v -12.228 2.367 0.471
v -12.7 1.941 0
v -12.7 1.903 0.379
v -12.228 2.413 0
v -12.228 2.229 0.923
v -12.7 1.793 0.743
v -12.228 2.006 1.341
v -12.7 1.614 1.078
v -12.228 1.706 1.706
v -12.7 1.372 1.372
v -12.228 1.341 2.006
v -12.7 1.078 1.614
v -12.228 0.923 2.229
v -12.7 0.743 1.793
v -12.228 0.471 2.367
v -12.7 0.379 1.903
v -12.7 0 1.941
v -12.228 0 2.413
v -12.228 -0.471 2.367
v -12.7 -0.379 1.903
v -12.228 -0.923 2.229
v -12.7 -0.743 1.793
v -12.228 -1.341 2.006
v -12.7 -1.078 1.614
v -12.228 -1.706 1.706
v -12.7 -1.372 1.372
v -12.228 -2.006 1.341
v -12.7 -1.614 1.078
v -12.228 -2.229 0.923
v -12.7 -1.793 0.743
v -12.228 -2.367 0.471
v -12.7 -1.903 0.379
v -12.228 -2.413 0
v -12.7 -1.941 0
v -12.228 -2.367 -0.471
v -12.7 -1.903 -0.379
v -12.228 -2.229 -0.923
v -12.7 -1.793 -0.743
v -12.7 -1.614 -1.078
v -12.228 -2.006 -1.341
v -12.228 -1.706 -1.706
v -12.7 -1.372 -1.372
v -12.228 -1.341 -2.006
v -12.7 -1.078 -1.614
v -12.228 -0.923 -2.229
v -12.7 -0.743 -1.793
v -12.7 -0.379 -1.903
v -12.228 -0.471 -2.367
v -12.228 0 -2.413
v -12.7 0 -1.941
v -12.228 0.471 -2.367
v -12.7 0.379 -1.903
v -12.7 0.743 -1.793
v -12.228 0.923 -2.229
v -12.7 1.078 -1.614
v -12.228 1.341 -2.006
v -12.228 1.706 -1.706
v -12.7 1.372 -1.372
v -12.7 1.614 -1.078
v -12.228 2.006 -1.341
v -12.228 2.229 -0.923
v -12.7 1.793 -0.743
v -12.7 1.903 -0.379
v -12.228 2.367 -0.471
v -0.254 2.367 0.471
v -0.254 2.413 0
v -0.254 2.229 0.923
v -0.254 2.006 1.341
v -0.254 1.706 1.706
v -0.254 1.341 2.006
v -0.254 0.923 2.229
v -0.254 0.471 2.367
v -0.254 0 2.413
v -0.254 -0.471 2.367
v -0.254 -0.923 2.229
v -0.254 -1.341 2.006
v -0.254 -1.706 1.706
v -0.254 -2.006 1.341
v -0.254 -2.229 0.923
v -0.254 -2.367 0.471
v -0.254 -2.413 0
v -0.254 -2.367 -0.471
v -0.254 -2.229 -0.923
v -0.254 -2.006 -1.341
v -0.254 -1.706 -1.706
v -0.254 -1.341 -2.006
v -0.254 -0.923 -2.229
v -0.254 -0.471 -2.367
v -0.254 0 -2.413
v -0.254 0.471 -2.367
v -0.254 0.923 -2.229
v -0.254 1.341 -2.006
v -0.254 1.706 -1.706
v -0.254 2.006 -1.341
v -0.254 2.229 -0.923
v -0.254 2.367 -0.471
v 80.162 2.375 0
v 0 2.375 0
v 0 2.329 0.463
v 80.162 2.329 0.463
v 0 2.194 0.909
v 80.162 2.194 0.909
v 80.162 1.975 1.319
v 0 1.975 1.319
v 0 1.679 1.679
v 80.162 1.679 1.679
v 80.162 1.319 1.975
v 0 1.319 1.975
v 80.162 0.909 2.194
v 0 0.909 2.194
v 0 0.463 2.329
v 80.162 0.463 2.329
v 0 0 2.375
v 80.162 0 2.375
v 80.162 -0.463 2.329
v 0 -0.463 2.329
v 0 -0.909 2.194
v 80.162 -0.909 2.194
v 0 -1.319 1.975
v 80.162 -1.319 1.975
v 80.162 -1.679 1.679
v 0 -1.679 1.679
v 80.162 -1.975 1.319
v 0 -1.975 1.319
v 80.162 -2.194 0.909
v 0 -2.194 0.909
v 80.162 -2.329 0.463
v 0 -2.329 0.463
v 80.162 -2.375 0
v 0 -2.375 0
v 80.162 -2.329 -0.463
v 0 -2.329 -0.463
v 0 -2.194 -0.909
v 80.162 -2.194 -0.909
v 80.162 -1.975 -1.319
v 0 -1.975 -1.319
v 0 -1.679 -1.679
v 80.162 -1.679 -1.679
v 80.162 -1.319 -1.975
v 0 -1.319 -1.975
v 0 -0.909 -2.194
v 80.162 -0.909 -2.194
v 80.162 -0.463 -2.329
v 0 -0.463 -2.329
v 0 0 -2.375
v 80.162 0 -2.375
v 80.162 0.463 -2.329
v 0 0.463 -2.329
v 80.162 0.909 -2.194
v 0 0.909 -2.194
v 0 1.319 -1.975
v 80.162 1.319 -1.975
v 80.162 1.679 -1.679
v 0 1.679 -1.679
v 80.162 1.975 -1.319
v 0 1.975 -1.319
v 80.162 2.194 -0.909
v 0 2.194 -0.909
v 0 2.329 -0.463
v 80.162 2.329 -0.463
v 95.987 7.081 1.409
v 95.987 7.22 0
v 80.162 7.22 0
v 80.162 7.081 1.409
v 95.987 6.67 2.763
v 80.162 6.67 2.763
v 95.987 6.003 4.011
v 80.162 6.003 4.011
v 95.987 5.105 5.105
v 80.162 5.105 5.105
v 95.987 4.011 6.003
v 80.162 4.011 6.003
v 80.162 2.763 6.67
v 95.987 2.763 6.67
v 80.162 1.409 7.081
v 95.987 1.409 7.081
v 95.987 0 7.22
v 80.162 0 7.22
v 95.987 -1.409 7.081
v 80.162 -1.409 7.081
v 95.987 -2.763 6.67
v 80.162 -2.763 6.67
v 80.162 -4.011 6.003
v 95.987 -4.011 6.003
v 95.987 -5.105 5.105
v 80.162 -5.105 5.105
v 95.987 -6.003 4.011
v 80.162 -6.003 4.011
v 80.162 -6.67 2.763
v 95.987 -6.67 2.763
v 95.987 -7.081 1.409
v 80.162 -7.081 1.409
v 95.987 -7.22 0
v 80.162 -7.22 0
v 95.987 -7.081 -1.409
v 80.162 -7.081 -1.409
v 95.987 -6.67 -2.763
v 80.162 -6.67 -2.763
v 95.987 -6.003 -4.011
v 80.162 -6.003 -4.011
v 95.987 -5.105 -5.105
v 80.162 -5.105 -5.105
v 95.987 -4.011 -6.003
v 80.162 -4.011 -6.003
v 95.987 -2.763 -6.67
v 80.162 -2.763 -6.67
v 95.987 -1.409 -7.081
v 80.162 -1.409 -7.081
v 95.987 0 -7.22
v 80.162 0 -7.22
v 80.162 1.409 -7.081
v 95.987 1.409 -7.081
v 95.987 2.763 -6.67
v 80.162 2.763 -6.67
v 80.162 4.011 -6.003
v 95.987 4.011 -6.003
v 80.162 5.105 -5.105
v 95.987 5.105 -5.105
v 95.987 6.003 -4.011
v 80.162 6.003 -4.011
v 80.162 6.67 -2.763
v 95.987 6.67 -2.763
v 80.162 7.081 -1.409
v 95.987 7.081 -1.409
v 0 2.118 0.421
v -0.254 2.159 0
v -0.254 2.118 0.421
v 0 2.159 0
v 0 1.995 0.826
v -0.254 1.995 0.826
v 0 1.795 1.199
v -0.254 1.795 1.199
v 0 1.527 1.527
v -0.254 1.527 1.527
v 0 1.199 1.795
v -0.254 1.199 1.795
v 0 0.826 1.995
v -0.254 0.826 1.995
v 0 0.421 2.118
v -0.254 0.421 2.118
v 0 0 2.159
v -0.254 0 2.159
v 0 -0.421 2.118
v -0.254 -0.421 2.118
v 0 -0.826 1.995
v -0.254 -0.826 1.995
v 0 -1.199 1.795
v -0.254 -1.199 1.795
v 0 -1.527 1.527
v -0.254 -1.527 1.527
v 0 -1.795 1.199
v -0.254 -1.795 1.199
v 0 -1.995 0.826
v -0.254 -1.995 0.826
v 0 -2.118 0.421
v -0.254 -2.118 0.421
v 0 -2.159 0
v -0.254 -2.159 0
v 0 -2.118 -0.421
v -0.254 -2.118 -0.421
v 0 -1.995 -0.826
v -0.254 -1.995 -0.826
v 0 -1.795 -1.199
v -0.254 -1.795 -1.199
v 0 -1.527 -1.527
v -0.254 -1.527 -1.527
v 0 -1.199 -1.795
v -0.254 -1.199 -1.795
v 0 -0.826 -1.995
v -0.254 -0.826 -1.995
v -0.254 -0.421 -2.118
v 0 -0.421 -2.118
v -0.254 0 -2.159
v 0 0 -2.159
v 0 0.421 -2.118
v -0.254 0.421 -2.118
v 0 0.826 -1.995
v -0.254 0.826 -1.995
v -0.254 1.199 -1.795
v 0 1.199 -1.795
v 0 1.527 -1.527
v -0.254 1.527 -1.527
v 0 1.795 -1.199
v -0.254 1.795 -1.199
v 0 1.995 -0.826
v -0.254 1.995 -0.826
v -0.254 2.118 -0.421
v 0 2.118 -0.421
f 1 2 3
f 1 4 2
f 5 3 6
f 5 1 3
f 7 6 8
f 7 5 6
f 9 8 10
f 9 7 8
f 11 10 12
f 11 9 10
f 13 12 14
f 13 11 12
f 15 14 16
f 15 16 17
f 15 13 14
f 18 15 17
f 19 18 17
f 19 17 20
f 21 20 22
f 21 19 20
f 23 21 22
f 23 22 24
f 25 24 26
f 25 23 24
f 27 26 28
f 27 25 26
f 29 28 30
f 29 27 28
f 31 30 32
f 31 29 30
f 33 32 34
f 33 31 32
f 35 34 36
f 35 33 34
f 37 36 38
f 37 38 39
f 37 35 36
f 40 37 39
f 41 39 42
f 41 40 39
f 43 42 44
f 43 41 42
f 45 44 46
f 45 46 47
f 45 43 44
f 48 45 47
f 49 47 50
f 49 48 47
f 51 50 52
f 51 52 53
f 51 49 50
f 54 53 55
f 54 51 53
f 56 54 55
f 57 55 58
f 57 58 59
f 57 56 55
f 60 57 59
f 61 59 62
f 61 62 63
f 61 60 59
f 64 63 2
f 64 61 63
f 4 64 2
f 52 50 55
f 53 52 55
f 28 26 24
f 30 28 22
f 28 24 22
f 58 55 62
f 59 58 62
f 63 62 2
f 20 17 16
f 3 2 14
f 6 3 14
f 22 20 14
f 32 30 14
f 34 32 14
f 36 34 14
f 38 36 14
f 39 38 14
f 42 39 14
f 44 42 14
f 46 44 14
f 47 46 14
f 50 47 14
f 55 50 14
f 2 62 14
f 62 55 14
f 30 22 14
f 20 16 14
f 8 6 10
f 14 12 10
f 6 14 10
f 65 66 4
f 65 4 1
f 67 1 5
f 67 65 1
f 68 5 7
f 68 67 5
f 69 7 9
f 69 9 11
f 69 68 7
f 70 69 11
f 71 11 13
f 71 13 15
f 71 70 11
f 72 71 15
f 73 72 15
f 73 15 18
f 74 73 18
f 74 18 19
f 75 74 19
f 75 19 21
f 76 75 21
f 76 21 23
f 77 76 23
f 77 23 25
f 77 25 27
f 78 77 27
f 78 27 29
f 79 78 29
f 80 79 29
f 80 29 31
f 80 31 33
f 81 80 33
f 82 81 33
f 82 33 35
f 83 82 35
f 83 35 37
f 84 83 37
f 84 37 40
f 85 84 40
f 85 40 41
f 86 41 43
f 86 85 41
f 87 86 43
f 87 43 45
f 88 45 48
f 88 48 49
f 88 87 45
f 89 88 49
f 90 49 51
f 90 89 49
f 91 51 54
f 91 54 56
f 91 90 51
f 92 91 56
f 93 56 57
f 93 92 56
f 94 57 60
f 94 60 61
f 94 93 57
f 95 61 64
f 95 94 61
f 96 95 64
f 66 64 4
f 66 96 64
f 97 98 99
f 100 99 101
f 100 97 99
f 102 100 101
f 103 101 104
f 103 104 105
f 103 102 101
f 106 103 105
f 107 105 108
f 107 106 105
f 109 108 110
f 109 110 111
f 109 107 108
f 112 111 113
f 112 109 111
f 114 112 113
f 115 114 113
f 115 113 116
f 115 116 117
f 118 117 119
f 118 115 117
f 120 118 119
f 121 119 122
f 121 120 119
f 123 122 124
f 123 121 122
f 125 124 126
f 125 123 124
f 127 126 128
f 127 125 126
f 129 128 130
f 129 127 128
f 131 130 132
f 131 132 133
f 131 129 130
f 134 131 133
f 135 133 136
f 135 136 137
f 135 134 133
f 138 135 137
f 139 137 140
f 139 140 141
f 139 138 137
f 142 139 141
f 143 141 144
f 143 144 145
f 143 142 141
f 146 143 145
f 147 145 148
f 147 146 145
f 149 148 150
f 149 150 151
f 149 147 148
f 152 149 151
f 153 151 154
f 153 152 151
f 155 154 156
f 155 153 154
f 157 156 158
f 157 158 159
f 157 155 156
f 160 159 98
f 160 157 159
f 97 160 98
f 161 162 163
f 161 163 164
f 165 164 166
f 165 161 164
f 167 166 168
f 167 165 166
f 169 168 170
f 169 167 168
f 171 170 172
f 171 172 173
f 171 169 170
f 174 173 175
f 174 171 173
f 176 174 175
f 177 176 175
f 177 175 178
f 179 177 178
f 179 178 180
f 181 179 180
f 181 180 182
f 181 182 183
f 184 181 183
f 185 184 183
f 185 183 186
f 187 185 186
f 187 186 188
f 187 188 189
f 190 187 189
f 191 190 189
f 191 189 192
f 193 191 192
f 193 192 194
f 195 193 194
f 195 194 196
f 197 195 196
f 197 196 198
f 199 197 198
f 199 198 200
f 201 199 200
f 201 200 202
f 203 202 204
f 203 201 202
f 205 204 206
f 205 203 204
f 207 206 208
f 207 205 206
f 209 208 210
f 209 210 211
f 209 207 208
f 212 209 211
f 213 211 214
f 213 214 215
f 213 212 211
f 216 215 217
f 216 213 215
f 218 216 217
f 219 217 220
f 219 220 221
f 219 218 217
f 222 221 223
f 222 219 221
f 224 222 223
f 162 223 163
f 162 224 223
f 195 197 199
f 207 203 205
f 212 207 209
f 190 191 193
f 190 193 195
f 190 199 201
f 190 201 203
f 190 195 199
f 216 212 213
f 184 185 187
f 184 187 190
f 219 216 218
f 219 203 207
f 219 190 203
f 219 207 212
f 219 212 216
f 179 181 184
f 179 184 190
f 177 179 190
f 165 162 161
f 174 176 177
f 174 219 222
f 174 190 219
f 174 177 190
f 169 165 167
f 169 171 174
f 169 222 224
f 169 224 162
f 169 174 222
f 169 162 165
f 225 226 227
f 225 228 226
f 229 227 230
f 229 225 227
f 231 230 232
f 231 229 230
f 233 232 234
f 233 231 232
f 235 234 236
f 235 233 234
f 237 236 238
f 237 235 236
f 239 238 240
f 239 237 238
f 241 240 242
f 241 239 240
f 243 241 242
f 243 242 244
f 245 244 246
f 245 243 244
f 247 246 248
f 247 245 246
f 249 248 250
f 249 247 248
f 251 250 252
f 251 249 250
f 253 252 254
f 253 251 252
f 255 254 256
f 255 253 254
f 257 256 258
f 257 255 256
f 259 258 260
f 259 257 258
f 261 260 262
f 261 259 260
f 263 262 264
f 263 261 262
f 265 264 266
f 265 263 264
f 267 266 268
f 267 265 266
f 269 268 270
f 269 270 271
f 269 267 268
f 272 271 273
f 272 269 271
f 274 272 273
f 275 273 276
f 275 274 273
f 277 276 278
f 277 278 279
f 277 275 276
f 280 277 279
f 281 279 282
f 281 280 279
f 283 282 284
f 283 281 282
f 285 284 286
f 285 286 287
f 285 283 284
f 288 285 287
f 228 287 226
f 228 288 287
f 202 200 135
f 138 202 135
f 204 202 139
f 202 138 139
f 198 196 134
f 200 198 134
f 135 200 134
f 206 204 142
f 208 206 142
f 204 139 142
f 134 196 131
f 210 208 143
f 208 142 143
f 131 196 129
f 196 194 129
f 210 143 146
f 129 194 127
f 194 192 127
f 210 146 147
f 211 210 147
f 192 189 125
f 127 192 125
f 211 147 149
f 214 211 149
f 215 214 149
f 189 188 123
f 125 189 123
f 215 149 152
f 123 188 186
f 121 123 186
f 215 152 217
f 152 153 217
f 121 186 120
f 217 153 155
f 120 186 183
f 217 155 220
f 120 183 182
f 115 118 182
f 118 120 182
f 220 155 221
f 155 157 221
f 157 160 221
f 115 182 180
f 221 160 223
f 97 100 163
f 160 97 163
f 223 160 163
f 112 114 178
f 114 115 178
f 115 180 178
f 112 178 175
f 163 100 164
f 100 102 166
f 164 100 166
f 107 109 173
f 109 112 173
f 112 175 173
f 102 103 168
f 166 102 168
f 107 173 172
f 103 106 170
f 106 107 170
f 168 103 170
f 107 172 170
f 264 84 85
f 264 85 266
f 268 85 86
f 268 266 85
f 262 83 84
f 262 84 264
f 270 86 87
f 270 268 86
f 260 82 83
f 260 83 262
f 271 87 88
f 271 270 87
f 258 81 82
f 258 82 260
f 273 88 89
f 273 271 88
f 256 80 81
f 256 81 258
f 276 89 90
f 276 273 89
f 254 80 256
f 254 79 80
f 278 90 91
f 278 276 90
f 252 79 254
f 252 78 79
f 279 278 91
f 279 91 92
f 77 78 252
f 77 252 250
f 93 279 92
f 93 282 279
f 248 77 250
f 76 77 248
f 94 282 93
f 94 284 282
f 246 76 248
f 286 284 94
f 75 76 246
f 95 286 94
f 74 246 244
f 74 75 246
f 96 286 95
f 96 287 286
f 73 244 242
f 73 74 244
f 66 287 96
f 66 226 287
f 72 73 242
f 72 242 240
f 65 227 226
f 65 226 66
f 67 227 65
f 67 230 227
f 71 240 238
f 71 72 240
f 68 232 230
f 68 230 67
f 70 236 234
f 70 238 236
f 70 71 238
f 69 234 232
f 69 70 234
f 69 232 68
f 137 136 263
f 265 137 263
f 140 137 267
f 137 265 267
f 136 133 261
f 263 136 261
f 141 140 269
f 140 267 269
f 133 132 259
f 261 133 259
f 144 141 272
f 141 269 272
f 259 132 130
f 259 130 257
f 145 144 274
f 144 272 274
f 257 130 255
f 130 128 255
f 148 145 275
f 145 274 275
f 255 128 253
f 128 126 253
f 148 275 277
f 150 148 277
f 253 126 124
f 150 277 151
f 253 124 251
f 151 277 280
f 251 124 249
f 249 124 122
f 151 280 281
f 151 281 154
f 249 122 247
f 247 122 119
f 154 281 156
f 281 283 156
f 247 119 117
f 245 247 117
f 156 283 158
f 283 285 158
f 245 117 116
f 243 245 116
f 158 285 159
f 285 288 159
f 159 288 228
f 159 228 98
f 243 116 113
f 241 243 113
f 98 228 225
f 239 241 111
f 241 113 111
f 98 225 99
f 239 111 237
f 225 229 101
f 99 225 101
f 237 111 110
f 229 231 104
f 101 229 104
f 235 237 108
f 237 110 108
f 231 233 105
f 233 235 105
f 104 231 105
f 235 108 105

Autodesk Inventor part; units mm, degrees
sketch "Sketch_1" plane through (0, 0, 0) normal (0, 0, 1) x (1, 0, 0)
  line L0 (95.9866, 0) -> (0, 0)
  line L1 (0, 0) -> (0, 2.3749)
  line L2 (0, 2.3749) -> (80.1624, 2.3749)
  line L3 (80.1624, 2.3749) -> (80.1624, 7.22)
  line L4 (80.1624, 7.22) -> (95.9866, 7.22)
  line L5 (95.9866, 7.22) -> (95.9866, 0)
  line L6 (95.9866, 0) -> (0, 0)
revolve "Revolution1" add sketch "Sketch_1" angle 360 about axis through (95.9866, 0, 0) along (1, 0, 0)
sketch "Sketch_3" plane through (0, 0, 0) normal (0, 0, 1) x (1, 0, 0)
  line L0 (0, 0) -> (-12.7, 0)
  line L1 (-12.7, 0) -> (-12.7, 1.9406)
  line L2 (-12.7, 1.9406) -> (-12.2276, 2.413)
  line L3 (-12.2276, 2.413) -> (0, 2.413)
  line L4 (0, 2.413) -> (0, 0)
  line L5 (0, 0) -> (-12.7, 0)
revolve "Revolution2" add sketch "Sketch_3" angle 360 about axis through (0, 0, 0) along (1, 0, 0)
thread "Thread1" size "10-32 UNF" class "2A" standard "ANSI Unified Screw Threads" full length
sketch "Sketch_30" plane through (0, 0, 0) normal (0, 0, 1) x (1, 0, 0)
  line L0 (0, 0) -> (-0.254, 0)
  line L1 (-0.254, 2.159) -> (0, 2.159)
  line L2 (0, 2.159) -> (0, 2.667)
  line L3 (0, 2.667) -> (-0.254, 2.667)
  line L4 (-0.254, 2.667) -> (-0.254, 2.159)
revolve "Revolution3" cut sketch "Sketch_30" angle 360 about axis through (0, 0, 0) along (1, 0, 0)
ref_plane "dia1_XY" through (0, 2.3749, 0) normal (1, 0, 0) x (0, 0, -1)
ref_plane "dia1_YZ" through (0, 2.3749, 0) normal (0, 0, -1) x (0, 1, 0)
ref_plane "dia1_ZX" through (0, 2.3749, 0) normal (0, 1, 0) x (1, 0, 0)
ref_plane "dia12_XY" through (0, 0, 7.8105) normal (1, 0, 0) x (0, 0, -1)
ref_plane "dia12_YZ" through (0, 0, 7.8105) normal (0, 0, -1) x (0, 1, 0)
ref_plane "dia12_ZX" through (0, 0, 7.8105) normal (0, 1, 0) x (1, 0, 0)
ref_plane "dia2_XY" through (0, -2.3749, 0) normal (1, 0, 0) x (0, 0, -1)
ref_plane "dia2_YZ" through (0, -2.3749, 0) normal (0, 0, -1) x (0, 1, 0)
ref_plane "dia2_ZX" through (0, -2.3749, 0) normal (0, 1, 0) x (1, 0, 0)
ref_plane "dia22_XY" through (0, 0, -7.8105) normal (1, 0, 0) x (0, 0, -1)
ref_plane "dia22_YZ" through (0, 0, -7.8105) normal (0, 0, -1) x (0, 1, 0)
ref_plane "dia22_ZX" through (0, 0, -7.8105) normal (0, 1, 0) x (1, 0, 0)
ref_plane "rl1_XY" through (-12.7, 0, 0) normal (1, 0, 0) x (0, 0, -1)
ref_plane "rl1_YZ" through (-12.7, 0, 0) normal (0, 0, -1) x (0, 1, 0)
ref_plane "rl1_ZX" through (-12.7, 0, 0) normal (0, 1, 0) x (1, 0, 0)
ref_plane "rl2_XY" through (0, 0, 0) normal (1, 0, 0) x (0, 0, -1)
ref_plane "rl2_YZ" through (0, 0, 0) normal (0, 0, -1) x (0, 1, 0)
ref_plane "rl2_ZX" through (0, 0, 0) normal (0, 1, 0) x (1, 0, 0)
ref_plane "rod_cp_XY" through (0, 0, 0) normal (1, 0, 0) x (0, 0, -1)
ref_plane "rod_cp_YZ" through (0, 0, 0) normal (0, 0, -1) x (0, 1, 0)
ref_plane "rod_cp_ZX" through (0, 0, 0) normal (0, 1, 0) x (1, 0, 0)
ref_plane "thd1_XY" through (-12.7, 2.413, 0) normal (1, 0, 0) x (0, 0, -1)
ref_plane "thd1_YZ" through (-12.7, 2.413, 0) normal (0, 0, -1) x (0, 1, 0)
ref_plane "thd1_ZX" through (-12.7, 2.413, 0) normal (0, 1, 0) x (1, 0, 0)
ref_plane "thd2_XY" through (-12.7, -2.413, 0) normal (1, 0, 0) x (0, 0, -1)
ref_plane "thd2_YZ" through (-12.7, -2.413, 0) normal (0, 0, -1) x (0, 1, 0)
ref_plane "thd2_ZX" through (-12.7, -2.413, 0) normal (0, 1, 0) x (1, 0, 0)
ref_plane "to_rod_clevis_XY" through (-12.7, 0, 0) normal (1, 0, 0) x (0, 0, -1)
ref_plane "to_rod_clevis_YZ" through (-12.7, 0, 0) normal (0, 0, -1) x (0, 1, 0)
ref_plane "to_rod_clevis_ZX" through (-12.7, 0, 0) normal (0, 1, 0) x (1, 0, 0)
properties part number "022-DXP0000_rod"
